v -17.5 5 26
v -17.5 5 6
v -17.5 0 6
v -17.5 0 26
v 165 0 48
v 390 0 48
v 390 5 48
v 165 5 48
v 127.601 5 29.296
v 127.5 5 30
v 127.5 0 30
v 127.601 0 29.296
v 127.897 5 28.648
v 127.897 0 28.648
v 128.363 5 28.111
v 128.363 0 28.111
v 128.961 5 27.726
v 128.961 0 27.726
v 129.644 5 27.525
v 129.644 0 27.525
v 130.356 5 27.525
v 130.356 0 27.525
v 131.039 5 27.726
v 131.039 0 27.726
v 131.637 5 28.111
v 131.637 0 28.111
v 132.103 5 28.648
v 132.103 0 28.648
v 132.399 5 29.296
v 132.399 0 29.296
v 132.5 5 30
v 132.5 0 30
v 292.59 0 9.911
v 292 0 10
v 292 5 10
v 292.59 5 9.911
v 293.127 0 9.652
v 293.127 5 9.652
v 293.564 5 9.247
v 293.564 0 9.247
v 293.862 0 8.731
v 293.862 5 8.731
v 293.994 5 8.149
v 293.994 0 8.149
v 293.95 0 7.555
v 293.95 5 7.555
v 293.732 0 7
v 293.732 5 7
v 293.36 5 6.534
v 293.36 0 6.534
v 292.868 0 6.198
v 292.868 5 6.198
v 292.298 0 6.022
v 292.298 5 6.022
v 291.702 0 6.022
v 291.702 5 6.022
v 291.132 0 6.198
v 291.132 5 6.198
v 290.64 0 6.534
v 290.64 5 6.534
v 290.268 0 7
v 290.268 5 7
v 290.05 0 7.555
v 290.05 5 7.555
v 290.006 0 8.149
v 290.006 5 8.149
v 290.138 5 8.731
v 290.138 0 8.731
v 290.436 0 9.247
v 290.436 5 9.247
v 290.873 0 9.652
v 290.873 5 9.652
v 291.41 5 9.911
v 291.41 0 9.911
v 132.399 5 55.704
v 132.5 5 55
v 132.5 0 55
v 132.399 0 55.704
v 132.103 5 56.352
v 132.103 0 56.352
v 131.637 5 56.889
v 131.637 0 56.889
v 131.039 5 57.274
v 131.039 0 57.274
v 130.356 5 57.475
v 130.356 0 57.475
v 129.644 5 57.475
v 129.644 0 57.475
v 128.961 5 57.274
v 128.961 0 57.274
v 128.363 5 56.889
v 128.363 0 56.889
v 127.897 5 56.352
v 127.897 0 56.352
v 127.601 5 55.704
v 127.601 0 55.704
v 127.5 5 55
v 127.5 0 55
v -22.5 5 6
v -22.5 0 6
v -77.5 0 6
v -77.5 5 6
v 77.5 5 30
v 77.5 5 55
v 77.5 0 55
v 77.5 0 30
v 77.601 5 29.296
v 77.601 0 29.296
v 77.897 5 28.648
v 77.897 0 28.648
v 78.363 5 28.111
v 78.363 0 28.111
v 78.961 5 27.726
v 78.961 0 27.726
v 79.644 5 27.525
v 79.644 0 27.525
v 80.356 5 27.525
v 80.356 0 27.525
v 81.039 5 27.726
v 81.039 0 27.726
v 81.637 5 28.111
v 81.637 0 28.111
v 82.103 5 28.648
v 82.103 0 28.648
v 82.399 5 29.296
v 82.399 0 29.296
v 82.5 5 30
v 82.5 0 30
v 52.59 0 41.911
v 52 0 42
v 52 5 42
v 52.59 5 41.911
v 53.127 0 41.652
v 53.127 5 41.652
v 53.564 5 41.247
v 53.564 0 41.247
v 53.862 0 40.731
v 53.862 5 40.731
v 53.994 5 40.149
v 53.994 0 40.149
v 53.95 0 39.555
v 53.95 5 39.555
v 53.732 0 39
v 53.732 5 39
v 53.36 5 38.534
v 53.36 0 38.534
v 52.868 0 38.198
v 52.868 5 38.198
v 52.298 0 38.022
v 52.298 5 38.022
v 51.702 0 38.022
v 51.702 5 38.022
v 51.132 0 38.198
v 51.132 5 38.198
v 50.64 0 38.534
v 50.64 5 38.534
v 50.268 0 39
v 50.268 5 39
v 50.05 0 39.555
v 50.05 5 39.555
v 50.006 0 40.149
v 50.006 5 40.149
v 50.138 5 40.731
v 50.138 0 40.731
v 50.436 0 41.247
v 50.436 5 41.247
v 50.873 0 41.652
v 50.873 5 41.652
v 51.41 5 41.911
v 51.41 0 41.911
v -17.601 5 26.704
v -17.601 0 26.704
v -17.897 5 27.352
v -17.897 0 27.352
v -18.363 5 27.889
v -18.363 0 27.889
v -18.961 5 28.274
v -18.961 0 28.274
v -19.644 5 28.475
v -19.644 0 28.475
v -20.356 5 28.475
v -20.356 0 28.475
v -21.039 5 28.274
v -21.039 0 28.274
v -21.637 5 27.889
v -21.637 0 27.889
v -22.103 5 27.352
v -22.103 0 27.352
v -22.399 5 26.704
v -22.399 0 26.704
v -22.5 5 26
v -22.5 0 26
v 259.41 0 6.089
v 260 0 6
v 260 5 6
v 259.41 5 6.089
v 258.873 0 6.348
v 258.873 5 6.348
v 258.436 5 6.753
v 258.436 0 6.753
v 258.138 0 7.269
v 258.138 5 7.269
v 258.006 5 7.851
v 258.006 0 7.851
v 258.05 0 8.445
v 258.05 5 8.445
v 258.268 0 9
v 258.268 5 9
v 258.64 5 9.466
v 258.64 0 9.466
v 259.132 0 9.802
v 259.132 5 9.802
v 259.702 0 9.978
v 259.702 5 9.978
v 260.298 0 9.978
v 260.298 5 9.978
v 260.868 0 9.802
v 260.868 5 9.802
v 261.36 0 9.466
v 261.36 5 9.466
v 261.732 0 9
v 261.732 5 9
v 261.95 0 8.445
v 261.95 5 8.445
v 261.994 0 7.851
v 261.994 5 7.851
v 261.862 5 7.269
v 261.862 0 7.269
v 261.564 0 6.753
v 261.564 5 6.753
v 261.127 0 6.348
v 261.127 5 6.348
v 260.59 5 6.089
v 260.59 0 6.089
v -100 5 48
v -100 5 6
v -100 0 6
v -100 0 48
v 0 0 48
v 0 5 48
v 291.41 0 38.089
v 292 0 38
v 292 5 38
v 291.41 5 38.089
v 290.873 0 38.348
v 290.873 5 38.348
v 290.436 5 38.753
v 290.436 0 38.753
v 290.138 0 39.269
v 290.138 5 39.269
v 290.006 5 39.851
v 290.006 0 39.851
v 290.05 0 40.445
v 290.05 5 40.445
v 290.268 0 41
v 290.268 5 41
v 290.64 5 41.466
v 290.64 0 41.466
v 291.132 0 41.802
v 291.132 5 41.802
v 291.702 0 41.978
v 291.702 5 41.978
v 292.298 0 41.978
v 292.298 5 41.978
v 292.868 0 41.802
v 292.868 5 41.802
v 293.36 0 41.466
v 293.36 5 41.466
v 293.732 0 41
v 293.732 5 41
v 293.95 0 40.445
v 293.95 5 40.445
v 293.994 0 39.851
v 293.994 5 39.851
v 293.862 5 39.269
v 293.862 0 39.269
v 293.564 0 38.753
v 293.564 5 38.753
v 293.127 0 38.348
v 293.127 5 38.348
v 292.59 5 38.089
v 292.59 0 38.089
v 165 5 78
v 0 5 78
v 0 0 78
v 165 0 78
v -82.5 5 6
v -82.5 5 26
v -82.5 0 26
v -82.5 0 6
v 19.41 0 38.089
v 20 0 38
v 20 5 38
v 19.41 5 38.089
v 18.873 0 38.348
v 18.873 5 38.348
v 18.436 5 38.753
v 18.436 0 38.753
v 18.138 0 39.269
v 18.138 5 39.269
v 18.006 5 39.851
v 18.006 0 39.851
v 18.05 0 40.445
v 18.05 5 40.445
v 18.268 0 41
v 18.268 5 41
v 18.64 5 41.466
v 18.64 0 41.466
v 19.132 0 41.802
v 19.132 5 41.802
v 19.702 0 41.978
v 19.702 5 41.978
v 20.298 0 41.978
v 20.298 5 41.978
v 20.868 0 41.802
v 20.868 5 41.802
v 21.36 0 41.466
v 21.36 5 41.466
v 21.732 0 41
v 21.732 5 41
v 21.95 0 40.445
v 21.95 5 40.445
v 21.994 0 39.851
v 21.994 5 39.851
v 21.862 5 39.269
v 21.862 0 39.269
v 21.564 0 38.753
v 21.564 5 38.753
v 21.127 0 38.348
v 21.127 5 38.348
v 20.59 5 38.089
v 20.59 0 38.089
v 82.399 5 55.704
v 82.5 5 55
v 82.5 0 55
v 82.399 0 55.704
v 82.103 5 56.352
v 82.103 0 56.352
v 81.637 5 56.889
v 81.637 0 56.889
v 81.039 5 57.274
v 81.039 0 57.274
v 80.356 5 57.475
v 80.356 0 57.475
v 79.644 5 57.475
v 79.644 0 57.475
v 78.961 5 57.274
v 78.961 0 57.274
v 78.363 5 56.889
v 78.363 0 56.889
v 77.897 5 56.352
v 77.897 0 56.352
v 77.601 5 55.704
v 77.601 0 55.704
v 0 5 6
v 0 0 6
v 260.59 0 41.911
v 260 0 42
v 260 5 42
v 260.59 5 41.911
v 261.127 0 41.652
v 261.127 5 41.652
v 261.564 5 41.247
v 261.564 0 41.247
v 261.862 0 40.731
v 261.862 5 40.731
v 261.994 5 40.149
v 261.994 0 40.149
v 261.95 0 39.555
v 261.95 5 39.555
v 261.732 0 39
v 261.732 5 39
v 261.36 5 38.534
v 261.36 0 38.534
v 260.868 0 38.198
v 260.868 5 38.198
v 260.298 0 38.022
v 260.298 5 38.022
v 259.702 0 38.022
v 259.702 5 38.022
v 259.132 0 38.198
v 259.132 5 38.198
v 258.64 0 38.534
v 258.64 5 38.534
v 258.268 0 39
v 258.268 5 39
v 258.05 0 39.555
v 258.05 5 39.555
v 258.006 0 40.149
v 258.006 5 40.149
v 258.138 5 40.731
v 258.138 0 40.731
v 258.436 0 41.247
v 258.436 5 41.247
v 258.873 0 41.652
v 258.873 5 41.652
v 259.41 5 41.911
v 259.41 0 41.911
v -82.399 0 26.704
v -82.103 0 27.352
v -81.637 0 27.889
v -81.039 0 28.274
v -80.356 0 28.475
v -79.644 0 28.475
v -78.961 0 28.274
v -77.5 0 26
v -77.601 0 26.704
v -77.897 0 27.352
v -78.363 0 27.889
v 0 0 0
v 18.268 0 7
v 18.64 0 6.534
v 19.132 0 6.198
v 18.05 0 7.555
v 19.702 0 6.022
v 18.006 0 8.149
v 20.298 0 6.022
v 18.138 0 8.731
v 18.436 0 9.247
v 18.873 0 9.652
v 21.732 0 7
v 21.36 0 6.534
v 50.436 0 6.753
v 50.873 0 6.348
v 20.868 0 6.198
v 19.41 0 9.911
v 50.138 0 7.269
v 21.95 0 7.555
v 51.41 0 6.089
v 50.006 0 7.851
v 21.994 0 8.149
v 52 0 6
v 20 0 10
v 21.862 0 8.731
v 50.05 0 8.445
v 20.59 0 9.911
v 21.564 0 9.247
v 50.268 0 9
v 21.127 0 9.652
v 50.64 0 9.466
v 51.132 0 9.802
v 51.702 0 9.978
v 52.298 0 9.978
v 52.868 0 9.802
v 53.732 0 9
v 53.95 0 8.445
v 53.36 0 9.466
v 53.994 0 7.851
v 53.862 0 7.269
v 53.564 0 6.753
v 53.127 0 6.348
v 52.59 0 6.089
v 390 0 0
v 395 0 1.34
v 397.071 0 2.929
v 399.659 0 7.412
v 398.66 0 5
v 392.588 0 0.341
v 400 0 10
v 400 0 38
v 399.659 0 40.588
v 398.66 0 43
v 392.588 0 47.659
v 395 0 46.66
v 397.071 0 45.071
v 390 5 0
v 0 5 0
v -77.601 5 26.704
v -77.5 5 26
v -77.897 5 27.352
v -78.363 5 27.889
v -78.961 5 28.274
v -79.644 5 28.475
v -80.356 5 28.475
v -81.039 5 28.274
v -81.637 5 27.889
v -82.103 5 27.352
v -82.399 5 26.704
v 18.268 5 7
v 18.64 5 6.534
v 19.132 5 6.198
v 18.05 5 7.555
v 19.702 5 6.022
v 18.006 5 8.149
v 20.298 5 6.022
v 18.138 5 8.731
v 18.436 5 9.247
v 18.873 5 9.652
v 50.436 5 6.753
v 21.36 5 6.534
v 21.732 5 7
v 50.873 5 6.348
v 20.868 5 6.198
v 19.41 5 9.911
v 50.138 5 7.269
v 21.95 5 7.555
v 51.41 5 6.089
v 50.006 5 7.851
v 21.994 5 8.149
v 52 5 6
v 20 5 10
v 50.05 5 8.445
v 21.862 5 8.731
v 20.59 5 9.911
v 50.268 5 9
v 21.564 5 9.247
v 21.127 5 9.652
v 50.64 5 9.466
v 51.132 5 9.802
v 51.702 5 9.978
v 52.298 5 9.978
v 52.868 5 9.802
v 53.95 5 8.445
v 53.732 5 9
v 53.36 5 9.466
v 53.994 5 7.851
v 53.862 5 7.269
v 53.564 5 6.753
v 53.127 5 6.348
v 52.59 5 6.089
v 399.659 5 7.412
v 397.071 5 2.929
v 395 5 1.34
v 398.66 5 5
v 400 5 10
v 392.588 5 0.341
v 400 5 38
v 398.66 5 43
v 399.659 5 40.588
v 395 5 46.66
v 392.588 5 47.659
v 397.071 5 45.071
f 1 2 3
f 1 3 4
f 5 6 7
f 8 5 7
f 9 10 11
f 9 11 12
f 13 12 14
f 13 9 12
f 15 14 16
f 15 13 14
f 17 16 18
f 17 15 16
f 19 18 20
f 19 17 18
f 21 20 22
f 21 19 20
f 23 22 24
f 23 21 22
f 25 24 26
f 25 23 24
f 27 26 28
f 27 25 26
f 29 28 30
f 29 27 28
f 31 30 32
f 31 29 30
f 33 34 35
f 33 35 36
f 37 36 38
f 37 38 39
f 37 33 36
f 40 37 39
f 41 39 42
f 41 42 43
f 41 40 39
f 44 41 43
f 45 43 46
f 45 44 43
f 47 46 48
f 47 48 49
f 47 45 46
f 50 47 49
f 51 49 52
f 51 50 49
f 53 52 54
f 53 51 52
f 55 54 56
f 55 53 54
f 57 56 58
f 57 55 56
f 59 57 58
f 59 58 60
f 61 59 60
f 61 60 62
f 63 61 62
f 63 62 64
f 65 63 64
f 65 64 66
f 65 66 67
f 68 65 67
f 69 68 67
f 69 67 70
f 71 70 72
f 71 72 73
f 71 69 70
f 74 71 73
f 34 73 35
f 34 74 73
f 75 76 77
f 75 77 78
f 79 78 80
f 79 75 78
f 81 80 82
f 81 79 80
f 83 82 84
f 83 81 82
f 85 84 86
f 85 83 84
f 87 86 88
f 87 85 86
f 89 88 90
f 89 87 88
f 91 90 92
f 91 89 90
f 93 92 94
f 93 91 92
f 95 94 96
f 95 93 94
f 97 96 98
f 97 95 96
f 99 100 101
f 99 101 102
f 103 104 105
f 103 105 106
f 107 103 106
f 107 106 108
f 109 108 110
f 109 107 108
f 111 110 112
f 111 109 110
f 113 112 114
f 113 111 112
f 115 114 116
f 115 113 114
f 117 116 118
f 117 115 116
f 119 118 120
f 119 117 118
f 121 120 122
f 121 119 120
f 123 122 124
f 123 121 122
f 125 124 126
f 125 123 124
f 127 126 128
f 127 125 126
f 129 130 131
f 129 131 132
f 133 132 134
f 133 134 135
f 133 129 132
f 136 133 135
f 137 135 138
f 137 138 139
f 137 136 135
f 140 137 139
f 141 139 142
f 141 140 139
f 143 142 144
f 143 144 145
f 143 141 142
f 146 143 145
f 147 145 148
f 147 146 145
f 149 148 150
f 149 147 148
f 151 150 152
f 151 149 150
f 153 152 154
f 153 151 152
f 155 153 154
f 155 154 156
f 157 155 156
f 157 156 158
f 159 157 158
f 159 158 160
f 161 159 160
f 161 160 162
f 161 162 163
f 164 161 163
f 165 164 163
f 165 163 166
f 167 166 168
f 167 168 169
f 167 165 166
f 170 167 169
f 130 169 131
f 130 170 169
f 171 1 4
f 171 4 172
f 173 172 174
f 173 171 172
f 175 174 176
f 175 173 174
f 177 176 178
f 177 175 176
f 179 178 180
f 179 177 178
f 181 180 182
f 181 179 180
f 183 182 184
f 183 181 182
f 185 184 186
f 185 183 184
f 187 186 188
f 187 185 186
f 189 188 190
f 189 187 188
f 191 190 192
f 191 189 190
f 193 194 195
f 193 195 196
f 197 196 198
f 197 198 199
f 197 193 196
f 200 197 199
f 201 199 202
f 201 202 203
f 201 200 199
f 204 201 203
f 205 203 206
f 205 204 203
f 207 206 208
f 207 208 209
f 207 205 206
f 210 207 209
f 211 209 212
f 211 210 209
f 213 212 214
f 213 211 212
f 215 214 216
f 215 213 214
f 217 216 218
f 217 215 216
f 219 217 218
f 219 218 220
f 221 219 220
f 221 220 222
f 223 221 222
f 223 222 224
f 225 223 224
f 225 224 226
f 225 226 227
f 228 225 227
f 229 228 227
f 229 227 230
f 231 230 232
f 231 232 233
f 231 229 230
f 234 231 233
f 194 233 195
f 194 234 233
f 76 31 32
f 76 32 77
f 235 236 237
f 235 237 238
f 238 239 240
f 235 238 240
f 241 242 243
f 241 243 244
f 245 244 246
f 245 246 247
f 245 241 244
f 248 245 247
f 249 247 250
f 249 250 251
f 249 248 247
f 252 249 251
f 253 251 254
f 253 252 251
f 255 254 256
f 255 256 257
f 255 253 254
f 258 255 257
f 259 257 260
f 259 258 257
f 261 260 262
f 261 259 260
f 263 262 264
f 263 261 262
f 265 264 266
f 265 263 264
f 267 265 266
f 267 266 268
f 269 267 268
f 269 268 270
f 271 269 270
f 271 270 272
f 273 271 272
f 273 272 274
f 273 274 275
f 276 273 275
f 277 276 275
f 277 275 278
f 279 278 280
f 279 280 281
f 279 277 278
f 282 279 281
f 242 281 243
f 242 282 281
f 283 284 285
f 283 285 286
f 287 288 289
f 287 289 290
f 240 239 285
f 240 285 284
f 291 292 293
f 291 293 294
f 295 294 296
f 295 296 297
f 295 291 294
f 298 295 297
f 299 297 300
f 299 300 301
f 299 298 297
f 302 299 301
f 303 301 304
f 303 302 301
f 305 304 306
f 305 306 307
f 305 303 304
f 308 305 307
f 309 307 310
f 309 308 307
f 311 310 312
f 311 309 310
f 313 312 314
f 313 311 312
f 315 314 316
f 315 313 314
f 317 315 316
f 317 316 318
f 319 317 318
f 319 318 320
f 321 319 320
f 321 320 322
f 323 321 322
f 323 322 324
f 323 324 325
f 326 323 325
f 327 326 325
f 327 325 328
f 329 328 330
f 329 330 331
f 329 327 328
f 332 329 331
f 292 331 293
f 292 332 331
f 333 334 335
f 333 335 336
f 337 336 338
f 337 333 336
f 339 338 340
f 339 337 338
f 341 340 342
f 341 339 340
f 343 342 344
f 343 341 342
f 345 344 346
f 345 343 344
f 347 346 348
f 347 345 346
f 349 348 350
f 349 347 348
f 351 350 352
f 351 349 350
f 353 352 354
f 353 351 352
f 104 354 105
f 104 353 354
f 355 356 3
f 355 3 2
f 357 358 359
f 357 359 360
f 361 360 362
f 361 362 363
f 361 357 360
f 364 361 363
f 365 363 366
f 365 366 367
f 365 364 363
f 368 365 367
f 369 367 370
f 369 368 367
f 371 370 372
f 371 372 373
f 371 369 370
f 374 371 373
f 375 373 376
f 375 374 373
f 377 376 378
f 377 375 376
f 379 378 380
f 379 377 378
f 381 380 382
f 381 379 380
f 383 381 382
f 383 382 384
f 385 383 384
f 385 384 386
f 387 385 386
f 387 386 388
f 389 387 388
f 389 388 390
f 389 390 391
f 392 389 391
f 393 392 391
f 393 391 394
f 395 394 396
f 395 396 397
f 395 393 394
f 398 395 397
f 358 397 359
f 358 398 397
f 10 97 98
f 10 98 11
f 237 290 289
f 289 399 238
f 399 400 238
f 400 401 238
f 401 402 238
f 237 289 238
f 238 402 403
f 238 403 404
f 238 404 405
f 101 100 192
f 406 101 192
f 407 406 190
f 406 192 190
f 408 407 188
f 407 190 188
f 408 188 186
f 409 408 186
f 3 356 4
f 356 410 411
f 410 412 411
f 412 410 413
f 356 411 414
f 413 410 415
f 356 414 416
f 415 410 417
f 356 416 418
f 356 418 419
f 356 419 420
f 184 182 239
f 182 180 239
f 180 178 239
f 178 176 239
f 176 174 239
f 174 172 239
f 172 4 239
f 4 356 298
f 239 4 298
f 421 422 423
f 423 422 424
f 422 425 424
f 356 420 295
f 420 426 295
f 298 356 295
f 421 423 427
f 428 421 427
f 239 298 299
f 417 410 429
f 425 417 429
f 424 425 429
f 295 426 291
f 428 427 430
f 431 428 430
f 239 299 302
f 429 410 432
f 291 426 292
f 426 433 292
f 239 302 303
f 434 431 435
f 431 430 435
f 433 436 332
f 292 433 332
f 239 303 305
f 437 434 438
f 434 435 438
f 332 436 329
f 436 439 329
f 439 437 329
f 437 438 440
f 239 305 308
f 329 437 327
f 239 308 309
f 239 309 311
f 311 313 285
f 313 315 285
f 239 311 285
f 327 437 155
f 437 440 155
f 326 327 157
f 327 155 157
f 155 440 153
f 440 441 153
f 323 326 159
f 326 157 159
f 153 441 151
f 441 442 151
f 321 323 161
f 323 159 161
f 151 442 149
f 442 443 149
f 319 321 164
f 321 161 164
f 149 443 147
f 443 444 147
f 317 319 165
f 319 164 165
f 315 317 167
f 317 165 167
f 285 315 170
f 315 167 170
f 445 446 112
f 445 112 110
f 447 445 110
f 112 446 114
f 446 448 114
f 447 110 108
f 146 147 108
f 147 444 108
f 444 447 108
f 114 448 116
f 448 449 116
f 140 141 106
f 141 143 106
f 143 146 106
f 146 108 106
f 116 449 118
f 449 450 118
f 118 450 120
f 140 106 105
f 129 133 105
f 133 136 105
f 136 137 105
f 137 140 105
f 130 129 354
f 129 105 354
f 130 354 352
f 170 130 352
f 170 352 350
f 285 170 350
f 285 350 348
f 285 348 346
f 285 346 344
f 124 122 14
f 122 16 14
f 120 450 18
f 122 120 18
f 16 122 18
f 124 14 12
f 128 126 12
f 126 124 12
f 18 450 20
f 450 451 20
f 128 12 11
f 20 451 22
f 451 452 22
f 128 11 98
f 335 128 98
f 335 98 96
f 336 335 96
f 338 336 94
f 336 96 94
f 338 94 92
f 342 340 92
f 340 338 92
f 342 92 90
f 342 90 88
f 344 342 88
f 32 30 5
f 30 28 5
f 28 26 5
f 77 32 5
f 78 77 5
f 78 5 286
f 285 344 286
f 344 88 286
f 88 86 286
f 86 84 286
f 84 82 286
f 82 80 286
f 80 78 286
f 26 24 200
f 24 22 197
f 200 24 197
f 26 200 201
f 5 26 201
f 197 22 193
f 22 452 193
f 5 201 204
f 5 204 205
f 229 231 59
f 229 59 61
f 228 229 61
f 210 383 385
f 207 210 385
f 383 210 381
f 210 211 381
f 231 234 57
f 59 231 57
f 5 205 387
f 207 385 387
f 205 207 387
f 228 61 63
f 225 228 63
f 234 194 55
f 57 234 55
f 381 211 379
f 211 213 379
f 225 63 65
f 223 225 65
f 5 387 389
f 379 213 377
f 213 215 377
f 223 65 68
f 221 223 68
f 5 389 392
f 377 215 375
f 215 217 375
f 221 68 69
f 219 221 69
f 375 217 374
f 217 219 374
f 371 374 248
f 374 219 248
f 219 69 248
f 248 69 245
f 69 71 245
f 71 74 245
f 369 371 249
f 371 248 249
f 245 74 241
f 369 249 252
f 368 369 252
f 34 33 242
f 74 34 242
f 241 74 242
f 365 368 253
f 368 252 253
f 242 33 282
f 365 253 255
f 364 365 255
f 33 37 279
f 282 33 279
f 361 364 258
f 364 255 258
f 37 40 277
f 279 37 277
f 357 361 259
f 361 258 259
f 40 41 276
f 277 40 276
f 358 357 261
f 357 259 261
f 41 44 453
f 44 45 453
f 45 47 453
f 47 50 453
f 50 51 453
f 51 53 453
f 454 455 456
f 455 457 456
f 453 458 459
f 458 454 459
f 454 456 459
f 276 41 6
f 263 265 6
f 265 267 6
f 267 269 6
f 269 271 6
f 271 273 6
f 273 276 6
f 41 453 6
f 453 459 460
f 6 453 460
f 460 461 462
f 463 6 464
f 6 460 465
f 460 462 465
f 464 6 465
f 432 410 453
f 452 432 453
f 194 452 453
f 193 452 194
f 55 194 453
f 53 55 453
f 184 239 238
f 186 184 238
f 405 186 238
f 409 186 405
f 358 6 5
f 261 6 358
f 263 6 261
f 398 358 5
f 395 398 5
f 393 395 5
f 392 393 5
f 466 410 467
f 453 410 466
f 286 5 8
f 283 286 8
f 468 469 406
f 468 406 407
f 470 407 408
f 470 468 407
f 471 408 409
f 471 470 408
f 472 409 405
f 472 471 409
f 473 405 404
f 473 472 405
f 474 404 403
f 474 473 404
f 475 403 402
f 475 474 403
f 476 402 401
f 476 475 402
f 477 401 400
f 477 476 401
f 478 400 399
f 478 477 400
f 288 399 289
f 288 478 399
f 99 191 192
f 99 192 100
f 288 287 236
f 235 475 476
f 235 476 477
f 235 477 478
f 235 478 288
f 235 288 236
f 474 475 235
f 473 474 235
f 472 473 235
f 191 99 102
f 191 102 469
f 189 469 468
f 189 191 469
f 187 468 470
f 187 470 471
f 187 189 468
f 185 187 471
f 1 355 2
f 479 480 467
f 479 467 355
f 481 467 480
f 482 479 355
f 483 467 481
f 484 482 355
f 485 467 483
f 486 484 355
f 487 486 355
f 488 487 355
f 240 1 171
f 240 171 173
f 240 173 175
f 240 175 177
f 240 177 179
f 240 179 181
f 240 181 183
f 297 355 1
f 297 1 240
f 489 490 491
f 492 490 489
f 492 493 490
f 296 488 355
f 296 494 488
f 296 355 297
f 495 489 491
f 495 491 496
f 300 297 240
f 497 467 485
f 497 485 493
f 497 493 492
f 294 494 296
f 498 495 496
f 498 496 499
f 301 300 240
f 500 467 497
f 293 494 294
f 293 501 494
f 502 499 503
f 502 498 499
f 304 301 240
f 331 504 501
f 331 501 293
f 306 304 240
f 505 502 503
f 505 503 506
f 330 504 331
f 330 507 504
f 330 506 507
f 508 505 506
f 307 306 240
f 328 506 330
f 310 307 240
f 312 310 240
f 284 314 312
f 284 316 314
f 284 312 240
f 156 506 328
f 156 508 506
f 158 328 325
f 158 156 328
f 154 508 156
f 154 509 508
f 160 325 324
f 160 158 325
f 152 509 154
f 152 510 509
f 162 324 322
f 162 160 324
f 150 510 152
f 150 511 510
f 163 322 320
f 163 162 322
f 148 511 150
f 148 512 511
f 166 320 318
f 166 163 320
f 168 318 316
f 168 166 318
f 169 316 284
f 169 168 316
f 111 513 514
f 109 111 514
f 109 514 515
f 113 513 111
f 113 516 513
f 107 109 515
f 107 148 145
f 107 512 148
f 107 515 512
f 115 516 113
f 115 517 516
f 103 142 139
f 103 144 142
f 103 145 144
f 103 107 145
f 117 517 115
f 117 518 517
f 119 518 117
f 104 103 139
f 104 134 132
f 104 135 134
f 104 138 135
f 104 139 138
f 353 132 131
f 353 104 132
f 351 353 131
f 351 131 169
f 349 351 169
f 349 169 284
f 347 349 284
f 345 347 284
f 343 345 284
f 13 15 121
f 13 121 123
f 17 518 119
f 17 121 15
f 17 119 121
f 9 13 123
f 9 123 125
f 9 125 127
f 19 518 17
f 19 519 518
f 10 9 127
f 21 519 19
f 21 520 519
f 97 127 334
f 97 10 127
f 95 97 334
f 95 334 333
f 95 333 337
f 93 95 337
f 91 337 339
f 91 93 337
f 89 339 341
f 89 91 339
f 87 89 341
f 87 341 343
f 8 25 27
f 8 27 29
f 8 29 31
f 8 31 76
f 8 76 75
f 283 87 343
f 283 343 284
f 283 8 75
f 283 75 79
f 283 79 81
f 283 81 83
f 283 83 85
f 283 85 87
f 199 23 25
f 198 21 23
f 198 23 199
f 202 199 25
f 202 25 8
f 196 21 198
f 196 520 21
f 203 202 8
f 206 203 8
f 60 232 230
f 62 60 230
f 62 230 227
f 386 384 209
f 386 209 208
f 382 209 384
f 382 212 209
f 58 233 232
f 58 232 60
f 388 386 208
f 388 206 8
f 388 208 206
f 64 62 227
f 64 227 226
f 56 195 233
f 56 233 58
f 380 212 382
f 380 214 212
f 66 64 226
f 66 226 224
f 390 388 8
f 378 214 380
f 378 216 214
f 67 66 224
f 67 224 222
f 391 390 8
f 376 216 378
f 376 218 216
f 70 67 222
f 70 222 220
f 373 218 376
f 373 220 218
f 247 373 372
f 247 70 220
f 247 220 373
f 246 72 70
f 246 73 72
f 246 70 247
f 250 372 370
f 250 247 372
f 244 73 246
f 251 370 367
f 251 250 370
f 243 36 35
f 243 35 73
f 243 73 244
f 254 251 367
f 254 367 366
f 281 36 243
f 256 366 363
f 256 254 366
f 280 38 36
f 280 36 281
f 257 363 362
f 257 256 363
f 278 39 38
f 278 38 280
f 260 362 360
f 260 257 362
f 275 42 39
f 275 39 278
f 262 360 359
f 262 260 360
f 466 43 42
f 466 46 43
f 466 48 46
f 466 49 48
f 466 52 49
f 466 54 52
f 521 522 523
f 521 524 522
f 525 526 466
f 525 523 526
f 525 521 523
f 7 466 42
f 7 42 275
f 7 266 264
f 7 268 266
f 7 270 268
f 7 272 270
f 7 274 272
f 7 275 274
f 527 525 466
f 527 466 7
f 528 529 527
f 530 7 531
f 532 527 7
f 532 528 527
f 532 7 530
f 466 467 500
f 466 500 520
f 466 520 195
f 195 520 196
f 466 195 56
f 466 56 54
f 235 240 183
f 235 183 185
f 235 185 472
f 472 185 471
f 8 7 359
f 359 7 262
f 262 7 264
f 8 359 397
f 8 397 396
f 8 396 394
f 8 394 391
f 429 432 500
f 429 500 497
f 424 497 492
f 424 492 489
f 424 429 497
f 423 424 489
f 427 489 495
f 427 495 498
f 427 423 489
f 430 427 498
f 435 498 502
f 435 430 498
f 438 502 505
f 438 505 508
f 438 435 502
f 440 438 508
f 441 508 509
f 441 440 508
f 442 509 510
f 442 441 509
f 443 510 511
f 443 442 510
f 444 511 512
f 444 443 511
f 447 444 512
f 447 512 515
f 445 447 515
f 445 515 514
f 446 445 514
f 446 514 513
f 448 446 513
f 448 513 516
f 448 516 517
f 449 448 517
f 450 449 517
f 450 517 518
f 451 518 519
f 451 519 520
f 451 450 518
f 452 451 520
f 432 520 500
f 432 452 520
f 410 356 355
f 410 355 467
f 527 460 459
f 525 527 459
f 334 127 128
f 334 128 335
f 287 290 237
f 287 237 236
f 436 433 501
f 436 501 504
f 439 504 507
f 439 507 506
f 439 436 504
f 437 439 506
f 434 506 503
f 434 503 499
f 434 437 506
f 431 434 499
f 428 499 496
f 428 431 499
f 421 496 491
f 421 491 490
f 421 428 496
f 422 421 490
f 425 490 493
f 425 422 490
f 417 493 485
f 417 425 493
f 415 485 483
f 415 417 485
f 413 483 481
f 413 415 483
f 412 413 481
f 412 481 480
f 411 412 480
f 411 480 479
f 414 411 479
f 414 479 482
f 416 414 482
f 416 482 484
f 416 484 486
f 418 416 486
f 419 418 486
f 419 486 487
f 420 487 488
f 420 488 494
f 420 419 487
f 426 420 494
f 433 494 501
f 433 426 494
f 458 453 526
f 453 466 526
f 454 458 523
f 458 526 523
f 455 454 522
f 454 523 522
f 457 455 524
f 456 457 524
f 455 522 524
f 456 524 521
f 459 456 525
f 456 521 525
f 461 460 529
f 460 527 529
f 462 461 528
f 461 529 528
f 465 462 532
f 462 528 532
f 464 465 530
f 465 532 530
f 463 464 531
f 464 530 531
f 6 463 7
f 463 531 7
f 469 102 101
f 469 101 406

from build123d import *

# Parameters (mm, degrees)
SKETCH1_W           = 400
SKETCH1_H           = 48
SKETCH1_R           = 2
BOSS_EXTRUDE1_DEPTH = 5
SKETCH3_W           = 42
SKETCH3_H           = 5
BOSS_EXTRUDE2_DEPTH = 100
SKETCH5_W           = 165
SKETCH5_H           = 5
BOSS_EXTRUDE3_DEPTH = 30
CUT_EXTRUDE1_DEPTH  = 408.564718787
FILLET1_R           = 10


with BuildPart() as part:
    # Sketch1 → Boss-Extrude1 (new body)
    with BuildSketch(Plane(origin=(0, 0, 0), x_dir=(1, 0, 0), z_dir=(0, 1, 0))):
        with Locations((200, -24)):
            Rectangle(SKETCH1_W, SKETCH1_H)
        with Locations(Location((20, -8, 0), (0, 0, 270))):
            Circle(SKETCH1_R, mode=Mode.SUBTRACT)
        with Locations(Location((20, -40, 0), (0, 0, 90))):
            Circle(SKETCH1_R, mode=Mode.SUBTRACT)
        with Locations(Location((292, -8, 0), (0, 0, 270))):
            Circle(SKETCH1_R, mode=Mode.SUBTRACT)
        with Locations(Location((292, -40, 0), (0, 0, 90))):
            Circle(SKETCH1_R, mode=Mode.SUBTRACT)
        with Locations(Location((52, -40, 0), (0, 0, 270))):
            Circle(SKETCH1_R, mode=Mode.SUBTRACT)
        with Locations(Location((52, -8, 0), (0, 0, 90))):
            Circle(SKETCH1_R, mode=Mode.SUBTRACT)
        with Locations(Location((260, -40, 0), (0, 0, 270))):
            Circle(SKETCH1_R, mode=Mode.SUBTRACT)
        with Locations(Location((260, -8, 0), (0, 0, 90))):
            Circle(SKETCH1_R, mode=Mode.SUBTRACT)
    extrude(amount=BOSS_EXTRUDE1_DEPTH)

    # Sketch3 → Boss-Extrude2 (add)
    with BuildSketch(Plane.ZY):
        with Locations((27, 2.5)):
            Rectangle(SKETCH3_W, SKETCH3_H)
    extrude(amount=BOSS_EXTRUDE2_DEPTH)

    # Sketch5 → Boss-Extrude3 (add)
    with BuildSketch(Plane.XY.offset(48)):
        with Locations((82.5, 2.5)):
            Rectangle(SKETCH5_W, SKETCH5_H)
    extrude(amount=BOSS_EXTRUDE3_DEPTH)

    # Sketch4 → Cut-Extrude1 (cut, through all)
    with BuildSketch(Plane(origin=(0, 5, 0), x_dir=(1, 0, 0), z_dir=(0, 1, 0))):
        with BuildLine():
            Line((-77.5, -6), (-77.5, -26))
            ThreePointArc((-77.5, -26), (-80, -28.5), (-82.5, -26))
            Line((-82.5, -26), (-82.5, -6))
            ThreePointArc((-82.5, -6), (-80, -3.5), (-77.5, -6))
        make_face()
        with BuildLine():
            Line((-17.5, -6), (-17.5, -26))
            ThreePointArc((-17.5, -26), (-20, -28.5), (-22.5, -26))
            Line((-22.5, -26), (-22.5, -6))
            ThreePointArc((-22.5, -6), (-20, -3.5), (-17.5, -6))
        make_face()
        with BuildLine():
            Line((82.5, -30), (82.5, -55))
            ThreePointArc((82.5, -55), (80, -57.5), (77.5, -55))
            Line((77.5, -55), (77.5, -30))
            ThreePointArc((77.5, -30), (80, -27.5), (82.5, -30))
        make_face()
        with BuildLine():
            Line((132.5, -30), (132.5, -55))
            ThreePointArc((132.5, -55), (130, -57.5), (127.5, -55))
            Line((127.5, -55), (127.5, -30))
            ThreePointArc((127.5, -30), (130, -27.5), (132.5, -30))
        make_face()
    extrude(amount=-CUT_EXTRUDE1_DEPTH, mode=Mode.SUBTRACT)

    # Fillet1
    fillet1_edges = [part.edges().sort_by_distance(p)[0] for p in [
        (400, 2.5, 0),
        (400, 2.5, 48),
    ]]
    fillet(fillet1_edges, radius=FILLET1_R)


solid = part.part
